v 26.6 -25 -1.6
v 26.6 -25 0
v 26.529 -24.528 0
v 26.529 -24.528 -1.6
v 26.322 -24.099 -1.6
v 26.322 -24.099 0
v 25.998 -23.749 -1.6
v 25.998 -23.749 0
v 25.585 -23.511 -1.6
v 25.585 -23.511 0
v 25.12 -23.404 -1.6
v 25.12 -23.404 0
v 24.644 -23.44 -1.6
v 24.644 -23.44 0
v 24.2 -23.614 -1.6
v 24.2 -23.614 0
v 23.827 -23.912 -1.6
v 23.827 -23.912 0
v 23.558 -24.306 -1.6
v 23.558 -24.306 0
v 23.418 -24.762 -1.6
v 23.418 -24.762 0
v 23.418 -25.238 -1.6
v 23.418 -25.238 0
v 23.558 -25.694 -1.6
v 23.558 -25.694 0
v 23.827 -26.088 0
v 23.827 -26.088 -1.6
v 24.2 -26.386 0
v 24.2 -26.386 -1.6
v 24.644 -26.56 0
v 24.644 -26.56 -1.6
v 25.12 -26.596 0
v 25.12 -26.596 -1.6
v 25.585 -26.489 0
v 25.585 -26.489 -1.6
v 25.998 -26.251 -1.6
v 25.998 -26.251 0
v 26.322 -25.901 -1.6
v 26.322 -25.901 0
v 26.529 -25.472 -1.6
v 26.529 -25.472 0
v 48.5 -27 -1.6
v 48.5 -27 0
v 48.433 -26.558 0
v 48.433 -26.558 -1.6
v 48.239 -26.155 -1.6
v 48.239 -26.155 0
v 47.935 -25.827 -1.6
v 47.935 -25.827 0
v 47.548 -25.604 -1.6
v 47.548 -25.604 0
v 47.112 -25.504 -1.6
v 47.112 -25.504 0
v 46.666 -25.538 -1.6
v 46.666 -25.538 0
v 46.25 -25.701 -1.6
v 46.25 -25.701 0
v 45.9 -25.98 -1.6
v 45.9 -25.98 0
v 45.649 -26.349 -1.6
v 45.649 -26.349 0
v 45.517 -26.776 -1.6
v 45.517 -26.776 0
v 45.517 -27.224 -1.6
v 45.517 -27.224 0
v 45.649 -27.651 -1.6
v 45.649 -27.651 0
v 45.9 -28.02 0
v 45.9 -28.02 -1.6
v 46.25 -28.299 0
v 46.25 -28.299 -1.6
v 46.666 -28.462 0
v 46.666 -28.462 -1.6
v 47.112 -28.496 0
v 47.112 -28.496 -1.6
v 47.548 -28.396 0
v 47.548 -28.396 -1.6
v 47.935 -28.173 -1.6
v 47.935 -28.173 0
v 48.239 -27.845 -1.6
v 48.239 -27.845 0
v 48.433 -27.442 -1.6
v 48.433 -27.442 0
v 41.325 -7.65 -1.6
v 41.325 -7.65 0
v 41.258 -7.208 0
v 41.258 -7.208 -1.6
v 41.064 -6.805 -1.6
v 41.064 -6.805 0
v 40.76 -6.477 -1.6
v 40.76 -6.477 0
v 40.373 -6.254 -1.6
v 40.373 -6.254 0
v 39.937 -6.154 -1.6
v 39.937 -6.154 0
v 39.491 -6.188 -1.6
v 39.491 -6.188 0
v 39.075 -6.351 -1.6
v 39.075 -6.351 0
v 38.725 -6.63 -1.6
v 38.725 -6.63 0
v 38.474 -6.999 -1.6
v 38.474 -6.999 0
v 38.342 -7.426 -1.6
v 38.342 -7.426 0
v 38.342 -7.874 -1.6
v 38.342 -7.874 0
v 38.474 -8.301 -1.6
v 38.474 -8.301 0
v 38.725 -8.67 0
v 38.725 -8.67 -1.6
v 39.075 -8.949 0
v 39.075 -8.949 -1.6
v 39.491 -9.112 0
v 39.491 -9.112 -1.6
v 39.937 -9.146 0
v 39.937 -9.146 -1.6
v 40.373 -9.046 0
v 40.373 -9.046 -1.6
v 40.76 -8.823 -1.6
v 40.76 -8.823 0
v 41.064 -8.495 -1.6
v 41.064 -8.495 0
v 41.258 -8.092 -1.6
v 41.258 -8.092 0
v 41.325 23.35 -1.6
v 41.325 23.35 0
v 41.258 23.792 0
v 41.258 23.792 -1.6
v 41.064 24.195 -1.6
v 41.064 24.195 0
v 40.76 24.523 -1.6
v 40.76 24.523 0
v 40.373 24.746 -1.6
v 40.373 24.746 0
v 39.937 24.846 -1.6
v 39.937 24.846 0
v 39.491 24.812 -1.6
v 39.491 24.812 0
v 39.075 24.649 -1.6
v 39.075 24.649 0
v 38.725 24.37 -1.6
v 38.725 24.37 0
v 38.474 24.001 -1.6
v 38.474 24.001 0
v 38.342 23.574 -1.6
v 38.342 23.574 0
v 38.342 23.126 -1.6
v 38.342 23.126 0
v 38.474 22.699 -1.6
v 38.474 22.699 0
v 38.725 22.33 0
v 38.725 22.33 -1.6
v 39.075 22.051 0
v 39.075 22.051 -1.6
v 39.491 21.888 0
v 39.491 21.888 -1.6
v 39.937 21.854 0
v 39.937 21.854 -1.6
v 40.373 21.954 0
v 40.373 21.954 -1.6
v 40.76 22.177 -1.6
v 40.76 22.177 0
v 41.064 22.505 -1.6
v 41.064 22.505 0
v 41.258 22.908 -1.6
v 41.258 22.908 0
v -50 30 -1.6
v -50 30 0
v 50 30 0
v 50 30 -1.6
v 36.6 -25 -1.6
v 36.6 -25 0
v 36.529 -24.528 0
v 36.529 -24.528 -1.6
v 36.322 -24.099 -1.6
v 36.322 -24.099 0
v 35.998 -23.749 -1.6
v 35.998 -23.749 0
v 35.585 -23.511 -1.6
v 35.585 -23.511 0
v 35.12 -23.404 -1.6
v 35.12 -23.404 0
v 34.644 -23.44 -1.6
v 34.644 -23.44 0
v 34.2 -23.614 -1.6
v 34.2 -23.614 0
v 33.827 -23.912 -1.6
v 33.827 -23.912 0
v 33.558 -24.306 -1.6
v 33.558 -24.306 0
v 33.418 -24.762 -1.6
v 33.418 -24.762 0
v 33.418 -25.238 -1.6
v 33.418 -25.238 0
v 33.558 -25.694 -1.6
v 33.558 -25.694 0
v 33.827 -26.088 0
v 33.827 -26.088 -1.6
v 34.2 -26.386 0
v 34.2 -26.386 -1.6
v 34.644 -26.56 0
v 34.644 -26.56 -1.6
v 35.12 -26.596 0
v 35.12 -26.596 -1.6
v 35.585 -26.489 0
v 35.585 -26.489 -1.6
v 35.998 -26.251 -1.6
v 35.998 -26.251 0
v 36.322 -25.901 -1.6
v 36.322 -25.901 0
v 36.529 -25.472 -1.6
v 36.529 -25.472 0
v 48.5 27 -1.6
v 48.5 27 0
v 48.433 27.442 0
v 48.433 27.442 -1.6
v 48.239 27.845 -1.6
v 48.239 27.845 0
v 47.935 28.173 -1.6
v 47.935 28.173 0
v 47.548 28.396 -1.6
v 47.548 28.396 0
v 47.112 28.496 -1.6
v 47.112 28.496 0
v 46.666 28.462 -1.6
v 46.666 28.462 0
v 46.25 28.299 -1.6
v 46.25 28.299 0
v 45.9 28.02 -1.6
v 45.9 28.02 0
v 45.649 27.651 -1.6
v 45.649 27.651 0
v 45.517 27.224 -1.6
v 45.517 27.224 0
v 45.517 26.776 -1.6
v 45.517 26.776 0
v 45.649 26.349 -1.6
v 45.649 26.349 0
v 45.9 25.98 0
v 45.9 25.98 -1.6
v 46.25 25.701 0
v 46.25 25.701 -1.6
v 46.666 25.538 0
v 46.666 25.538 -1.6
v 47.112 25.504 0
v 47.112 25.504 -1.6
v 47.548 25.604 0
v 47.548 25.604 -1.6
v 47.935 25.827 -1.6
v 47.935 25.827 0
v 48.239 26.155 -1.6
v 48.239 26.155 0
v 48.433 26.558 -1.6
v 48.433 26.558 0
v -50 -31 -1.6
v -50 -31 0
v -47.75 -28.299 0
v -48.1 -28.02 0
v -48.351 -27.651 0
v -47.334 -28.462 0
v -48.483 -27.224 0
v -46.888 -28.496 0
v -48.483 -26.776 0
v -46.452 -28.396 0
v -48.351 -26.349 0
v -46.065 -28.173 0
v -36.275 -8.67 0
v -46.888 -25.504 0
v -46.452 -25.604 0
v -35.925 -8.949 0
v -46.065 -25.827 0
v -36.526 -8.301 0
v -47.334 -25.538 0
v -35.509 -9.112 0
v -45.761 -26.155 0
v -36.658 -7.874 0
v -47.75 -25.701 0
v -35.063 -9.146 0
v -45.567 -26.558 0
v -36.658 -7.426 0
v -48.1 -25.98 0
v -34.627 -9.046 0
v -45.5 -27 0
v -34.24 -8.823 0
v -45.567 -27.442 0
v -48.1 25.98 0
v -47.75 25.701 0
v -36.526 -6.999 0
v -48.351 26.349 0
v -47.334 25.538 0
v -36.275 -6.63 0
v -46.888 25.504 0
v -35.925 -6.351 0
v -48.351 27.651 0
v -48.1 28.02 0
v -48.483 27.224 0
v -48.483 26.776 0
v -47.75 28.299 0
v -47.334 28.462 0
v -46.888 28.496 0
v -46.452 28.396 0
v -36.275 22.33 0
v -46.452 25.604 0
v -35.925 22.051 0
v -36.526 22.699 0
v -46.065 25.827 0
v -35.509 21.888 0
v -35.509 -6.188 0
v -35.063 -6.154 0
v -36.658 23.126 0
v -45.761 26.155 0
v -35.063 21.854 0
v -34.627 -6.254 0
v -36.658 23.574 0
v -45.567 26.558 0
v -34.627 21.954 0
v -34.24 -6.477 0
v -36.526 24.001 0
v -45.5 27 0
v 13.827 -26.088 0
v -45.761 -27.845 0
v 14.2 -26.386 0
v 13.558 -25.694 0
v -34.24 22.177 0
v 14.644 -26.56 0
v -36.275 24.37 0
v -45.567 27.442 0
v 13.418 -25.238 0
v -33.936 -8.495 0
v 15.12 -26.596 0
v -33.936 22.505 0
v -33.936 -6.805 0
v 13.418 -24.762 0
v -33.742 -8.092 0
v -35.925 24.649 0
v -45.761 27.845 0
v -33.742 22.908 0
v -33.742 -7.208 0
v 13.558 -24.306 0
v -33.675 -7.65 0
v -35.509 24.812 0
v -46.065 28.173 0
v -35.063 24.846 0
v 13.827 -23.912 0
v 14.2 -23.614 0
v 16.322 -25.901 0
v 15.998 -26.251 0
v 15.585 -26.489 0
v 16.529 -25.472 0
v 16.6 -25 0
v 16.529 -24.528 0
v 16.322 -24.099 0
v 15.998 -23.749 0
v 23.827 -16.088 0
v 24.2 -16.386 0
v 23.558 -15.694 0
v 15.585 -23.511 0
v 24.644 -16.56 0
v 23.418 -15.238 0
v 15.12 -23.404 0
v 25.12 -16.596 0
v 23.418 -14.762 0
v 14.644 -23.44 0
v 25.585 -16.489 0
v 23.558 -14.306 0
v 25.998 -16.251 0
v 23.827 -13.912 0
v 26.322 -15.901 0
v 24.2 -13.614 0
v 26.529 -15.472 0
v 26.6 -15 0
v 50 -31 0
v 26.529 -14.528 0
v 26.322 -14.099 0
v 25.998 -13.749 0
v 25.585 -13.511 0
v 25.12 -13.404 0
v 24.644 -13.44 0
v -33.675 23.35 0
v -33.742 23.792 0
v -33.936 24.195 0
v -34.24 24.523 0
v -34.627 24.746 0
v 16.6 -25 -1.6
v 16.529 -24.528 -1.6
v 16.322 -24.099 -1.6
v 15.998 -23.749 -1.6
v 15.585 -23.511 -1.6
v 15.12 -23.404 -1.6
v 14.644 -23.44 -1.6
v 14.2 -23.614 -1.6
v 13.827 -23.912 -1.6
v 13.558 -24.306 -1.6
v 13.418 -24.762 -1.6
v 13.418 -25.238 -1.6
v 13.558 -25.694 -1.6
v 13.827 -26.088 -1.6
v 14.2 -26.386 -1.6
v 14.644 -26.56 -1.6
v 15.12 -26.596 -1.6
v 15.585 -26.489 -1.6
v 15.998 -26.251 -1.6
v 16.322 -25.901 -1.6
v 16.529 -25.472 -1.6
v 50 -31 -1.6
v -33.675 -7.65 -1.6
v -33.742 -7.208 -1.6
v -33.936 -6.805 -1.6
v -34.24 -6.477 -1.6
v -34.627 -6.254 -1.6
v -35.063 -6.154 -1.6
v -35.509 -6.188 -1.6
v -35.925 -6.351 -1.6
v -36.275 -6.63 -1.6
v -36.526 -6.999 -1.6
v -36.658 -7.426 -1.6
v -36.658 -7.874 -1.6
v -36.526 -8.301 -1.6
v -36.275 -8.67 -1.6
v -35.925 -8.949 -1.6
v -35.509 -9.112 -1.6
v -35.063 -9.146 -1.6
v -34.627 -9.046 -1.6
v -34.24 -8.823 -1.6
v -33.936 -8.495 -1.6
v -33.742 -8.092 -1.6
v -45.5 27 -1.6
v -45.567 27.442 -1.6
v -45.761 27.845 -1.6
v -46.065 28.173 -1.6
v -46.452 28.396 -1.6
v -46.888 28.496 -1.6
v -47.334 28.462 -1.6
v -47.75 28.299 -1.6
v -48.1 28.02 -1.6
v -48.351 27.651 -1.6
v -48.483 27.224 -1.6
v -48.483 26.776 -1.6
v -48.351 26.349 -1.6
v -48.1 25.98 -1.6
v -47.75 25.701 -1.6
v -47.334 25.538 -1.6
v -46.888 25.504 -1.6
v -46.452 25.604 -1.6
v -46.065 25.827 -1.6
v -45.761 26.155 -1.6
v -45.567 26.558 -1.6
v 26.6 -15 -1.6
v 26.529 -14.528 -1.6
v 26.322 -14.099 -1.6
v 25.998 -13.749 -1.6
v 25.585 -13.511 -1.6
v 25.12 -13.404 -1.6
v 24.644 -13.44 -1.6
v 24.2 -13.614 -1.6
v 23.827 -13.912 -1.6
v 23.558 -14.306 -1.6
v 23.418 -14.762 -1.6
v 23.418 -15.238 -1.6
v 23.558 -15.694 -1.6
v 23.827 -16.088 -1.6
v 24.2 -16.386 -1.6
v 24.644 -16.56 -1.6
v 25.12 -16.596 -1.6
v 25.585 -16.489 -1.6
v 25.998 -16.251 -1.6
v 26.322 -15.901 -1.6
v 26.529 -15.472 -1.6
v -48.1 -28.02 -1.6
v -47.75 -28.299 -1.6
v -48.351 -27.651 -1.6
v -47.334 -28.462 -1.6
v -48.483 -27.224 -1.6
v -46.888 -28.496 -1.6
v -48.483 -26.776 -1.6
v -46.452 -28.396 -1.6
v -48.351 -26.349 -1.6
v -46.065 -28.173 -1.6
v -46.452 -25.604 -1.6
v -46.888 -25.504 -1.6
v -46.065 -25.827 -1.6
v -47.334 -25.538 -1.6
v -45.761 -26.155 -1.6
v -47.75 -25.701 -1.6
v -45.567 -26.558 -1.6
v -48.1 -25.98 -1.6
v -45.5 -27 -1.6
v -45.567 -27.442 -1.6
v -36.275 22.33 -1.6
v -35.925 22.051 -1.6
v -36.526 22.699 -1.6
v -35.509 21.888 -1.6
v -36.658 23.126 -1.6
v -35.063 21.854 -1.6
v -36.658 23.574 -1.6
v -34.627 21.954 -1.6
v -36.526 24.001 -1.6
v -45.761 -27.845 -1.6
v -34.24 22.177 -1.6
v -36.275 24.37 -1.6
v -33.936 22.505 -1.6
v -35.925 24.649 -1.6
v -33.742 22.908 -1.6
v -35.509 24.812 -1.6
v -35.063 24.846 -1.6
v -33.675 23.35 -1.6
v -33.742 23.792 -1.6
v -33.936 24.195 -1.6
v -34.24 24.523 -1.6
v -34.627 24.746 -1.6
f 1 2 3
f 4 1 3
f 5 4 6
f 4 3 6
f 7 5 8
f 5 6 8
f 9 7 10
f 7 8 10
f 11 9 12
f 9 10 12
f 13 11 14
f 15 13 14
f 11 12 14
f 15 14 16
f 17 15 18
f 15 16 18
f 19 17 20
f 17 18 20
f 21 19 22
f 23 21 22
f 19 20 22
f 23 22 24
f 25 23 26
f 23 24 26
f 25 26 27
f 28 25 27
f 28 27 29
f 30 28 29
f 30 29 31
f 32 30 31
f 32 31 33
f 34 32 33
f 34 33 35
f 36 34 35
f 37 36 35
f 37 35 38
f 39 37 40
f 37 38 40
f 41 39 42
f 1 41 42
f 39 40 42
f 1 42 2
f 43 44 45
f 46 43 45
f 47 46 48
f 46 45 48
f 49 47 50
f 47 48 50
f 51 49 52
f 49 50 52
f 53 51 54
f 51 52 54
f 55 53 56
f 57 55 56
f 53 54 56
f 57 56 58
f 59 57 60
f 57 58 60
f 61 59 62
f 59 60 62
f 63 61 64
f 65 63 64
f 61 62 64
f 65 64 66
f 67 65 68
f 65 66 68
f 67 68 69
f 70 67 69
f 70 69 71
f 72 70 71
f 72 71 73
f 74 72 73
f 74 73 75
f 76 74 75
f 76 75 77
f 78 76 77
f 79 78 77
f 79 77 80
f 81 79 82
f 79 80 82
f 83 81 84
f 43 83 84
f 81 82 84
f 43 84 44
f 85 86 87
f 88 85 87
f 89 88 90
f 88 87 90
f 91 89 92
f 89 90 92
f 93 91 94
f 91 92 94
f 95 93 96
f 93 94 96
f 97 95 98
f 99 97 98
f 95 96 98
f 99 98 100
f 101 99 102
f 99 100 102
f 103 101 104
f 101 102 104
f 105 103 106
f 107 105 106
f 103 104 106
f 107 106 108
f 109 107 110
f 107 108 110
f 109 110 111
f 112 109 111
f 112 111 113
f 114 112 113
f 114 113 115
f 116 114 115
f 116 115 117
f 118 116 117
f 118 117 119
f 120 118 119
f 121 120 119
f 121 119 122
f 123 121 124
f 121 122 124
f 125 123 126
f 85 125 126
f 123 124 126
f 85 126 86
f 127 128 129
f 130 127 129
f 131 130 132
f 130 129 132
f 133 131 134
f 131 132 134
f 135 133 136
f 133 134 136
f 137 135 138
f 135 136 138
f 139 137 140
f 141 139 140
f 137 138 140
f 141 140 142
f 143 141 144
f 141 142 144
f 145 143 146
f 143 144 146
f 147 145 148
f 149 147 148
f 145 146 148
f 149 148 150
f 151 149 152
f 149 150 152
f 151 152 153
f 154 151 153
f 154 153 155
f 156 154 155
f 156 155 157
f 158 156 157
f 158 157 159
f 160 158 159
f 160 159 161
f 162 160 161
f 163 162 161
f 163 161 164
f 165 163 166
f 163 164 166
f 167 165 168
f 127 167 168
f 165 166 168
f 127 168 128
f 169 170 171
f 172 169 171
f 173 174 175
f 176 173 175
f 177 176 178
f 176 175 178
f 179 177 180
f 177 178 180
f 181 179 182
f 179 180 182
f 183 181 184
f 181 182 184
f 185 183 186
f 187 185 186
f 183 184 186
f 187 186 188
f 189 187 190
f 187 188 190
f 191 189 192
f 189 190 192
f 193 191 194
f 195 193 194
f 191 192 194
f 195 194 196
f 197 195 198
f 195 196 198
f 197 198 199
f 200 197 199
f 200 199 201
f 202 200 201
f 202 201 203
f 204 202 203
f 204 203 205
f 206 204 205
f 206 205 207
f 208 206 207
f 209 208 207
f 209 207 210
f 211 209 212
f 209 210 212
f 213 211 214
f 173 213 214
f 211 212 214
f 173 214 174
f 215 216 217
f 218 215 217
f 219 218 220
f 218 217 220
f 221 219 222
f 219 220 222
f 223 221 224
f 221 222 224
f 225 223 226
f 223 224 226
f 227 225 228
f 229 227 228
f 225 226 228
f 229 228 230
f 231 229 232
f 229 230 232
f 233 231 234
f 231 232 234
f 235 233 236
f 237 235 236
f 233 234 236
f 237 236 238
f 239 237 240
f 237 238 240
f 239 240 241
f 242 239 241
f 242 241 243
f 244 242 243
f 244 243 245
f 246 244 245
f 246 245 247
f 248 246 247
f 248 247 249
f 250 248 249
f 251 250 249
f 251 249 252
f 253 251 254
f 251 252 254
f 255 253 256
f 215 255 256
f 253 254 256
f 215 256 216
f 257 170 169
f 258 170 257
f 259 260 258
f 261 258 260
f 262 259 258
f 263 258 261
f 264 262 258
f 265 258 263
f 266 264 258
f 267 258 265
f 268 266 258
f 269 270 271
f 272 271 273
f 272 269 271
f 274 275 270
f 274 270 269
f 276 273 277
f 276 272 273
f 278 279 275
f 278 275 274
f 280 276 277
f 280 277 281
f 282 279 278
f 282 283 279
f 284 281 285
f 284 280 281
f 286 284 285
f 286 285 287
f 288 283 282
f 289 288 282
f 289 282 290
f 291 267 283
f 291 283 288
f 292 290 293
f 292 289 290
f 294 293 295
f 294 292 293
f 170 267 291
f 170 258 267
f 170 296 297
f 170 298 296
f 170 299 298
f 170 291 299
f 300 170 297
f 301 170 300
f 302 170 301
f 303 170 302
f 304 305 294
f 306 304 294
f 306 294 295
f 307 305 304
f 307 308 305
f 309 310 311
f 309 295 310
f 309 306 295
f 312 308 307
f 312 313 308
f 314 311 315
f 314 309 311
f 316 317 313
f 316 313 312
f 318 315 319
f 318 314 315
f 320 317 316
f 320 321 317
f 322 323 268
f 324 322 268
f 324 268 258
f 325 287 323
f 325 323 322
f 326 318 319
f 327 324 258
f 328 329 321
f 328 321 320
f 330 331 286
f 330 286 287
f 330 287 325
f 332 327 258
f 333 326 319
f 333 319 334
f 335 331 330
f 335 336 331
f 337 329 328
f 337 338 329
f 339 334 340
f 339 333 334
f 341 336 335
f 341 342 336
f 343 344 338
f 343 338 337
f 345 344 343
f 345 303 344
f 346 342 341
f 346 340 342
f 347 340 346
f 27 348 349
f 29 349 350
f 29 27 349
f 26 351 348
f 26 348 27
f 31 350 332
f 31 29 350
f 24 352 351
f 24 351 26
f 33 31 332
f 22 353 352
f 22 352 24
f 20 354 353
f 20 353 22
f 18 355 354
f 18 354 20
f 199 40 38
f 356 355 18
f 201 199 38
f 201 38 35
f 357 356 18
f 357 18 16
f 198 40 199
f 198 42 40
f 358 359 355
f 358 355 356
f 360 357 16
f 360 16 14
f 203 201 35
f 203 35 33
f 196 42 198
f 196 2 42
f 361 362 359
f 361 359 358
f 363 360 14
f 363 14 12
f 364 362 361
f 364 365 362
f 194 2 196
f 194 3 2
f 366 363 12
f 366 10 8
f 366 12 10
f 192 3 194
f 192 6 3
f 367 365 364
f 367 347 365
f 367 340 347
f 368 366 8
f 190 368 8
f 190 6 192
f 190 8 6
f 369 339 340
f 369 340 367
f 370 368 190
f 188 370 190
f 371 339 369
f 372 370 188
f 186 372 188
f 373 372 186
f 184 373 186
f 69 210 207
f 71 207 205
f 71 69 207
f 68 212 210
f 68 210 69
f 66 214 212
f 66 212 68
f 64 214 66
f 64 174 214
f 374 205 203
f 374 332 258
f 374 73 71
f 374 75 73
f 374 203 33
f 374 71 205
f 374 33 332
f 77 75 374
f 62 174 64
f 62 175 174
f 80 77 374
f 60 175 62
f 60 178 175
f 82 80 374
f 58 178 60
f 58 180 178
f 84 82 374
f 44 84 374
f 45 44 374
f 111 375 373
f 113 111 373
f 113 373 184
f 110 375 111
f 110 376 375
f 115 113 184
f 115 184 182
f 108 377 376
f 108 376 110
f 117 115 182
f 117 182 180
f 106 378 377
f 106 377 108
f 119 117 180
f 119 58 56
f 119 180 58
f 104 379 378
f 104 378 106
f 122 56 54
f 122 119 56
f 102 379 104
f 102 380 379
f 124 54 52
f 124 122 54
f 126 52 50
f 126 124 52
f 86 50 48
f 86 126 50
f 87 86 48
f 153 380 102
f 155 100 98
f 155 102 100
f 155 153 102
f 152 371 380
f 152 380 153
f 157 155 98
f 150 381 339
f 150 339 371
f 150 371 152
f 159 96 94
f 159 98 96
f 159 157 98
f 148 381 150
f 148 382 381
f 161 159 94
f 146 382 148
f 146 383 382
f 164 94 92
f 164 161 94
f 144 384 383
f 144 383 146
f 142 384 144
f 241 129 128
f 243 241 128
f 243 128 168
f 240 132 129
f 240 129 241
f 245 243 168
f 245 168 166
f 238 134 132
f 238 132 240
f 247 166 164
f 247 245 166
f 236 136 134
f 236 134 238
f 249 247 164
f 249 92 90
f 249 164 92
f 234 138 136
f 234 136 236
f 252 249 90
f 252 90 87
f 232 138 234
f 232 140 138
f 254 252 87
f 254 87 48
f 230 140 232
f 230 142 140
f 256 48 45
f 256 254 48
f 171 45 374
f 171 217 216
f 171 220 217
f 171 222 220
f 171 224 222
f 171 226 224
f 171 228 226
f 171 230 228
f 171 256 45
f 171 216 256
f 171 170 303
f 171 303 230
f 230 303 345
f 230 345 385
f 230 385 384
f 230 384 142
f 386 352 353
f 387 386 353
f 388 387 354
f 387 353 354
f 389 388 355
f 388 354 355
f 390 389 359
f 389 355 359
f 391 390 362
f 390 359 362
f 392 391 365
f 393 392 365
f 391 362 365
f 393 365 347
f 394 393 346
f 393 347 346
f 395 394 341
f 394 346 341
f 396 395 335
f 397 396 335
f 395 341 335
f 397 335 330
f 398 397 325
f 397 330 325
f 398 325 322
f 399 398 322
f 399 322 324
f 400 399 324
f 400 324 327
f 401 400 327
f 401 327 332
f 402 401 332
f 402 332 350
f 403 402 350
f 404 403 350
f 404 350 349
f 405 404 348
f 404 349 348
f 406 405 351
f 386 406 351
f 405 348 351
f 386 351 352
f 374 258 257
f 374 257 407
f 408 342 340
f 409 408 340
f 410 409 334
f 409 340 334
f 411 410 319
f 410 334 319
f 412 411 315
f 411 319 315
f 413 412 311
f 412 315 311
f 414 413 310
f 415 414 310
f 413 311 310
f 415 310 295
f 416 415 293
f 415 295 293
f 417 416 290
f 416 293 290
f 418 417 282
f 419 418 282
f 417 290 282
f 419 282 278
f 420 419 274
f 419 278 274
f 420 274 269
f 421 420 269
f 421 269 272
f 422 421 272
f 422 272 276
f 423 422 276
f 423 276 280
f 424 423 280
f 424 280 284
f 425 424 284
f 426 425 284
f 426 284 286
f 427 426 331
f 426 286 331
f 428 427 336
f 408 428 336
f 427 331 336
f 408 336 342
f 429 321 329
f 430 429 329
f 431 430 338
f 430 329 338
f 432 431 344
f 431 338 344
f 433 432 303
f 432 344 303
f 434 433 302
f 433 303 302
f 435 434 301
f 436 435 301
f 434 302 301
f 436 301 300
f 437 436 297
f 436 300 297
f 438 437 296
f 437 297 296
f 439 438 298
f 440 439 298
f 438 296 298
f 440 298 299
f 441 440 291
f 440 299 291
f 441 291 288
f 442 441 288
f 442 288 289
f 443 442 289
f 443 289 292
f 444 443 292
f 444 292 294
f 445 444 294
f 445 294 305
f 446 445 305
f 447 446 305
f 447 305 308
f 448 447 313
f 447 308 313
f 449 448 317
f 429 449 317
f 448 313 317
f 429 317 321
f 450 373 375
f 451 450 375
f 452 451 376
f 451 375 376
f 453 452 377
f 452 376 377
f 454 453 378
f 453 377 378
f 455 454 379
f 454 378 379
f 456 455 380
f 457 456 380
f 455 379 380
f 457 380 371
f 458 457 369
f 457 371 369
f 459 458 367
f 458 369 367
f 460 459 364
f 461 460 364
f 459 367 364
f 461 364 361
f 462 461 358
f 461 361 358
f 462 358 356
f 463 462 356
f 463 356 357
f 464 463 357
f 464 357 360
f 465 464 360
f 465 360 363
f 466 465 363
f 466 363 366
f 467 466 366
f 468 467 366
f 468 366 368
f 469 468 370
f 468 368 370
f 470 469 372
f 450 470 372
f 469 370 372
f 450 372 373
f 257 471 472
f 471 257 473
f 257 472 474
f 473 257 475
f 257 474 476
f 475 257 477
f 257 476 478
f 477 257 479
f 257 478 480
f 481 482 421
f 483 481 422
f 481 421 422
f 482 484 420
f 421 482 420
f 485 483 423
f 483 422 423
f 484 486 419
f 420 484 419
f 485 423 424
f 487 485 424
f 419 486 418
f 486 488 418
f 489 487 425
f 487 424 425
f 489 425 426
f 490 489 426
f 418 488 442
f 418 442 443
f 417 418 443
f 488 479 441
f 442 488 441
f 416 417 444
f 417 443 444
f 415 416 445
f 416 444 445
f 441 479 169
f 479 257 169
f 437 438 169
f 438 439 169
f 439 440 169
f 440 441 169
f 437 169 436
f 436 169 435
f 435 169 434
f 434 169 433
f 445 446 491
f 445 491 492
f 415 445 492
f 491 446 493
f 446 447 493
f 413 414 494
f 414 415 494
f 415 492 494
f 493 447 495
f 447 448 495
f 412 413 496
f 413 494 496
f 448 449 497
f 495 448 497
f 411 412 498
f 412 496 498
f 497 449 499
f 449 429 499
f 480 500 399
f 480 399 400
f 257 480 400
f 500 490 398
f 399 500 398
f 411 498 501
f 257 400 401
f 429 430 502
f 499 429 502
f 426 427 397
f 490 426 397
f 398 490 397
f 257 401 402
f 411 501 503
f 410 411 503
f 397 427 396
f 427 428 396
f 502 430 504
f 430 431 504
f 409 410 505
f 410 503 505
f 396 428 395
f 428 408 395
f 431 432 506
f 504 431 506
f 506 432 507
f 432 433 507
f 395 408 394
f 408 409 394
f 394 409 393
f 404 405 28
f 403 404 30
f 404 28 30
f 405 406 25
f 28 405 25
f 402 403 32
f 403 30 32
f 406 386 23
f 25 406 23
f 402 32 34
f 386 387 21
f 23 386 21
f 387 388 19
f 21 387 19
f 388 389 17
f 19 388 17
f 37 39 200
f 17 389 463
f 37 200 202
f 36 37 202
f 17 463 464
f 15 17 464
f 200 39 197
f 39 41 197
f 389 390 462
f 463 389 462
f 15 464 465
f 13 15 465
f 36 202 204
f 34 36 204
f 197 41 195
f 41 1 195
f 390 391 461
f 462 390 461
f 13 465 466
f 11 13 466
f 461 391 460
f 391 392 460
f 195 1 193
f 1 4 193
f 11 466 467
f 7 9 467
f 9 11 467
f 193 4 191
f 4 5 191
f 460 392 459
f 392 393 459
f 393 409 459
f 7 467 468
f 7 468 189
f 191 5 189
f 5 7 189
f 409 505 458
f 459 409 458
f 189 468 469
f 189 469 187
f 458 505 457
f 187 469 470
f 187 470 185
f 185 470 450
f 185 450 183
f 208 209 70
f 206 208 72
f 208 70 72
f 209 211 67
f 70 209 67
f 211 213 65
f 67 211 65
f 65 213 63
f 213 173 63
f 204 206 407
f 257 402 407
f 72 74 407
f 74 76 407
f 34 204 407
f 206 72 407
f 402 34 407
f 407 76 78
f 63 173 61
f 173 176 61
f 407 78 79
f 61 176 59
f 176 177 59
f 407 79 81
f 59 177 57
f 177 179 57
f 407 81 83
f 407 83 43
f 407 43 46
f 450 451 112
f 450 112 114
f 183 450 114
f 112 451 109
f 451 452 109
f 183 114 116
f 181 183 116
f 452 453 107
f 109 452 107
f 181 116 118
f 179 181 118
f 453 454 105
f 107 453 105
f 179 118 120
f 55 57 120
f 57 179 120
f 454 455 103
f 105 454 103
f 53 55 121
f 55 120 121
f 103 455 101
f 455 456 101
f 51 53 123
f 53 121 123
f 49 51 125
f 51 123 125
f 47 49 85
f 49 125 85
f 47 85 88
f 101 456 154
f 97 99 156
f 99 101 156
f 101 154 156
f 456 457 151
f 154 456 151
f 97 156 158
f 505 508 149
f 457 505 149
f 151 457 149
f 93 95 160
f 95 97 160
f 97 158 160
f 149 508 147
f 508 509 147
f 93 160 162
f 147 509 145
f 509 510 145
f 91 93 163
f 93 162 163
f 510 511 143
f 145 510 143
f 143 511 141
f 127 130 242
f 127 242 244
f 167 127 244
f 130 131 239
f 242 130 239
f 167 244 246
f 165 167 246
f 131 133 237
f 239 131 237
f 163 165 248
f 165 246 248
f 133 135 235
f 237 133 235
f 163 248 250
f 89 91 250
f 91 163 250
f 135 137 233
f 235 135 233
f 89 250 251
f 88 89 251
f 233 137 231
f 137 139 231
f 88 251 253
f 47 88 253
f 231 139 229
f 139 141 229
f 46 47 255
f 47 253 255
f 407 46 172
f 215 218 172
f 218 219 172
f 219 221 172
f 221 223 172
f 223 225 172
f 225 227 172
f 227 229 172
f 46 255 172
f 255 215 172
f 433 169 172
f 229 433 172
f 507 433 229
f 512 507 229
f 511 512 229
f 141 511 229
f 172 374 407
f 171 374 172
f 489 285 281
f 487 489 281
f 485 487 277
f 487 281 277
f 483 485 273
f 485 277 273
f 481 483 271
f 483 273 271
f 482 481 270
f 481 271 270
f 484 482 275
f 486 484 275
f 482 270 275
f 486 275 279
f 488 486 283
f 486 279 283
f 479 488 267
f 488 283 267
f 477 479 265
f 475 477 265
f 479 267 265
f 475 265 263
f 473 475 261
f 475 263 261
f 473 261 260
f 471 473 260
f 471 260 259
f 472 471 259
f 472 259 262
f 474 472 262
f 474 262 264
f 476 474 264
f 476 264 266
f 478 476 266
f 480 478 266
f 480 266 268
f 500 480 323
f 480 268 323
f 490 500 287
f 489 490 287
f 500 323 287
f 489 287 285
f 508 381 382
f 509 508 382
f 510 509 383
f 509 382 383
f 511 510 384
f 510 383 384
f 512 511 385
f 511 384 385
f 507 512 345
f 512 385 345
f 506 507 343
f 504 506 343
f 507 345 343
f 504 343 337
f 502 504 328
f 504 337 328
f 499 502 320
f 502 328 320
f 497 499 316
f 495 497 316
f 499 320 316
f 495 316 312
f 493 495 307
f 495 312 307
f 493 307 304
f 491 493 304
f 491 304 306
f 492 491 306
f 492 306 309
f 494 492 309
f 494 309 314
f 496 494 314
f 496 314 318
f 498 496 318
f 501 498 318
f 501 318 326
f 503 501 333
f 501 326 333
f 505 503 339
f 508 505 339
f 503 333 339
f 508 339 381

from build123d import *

# Parameters (mm, degrees)
F0_W     = 100
F0_H     = 60
F0_R     = 1.5
F0_R_2   = 1.6
F0_H_2   = 1
F1_DEPTH = 1.6


with BuildPart() as f1:
    # F0 (on Top) → F1 (new body)
    with BuildSketch(Plane.XY):
        Rectangle(F0_W, F0_H)
        with Locations((-47, -27)):
            Circle(F0_R, mode=Mode.SUBTRACT)
        with Locations((-35.175, -7.65)):
            Circle(F0_R, mode=Mode.SUBTRACT)
        with Locations((15, -25)):
            Circle(F0_R_2, mode=Mode.SUBTRACT)
        with Locations((25, -25)):
            Circle(F0_R_2, mode=Mode.SUBTRACT)
        with Locations((35, -25)):
            Circle(F0_R_2, mode=Mode.SUBTRACT)
        with Locations((47, -27)):
            Circle(F0_R, mode=Mode.SUBTRACT)
        with Locations((25, -15)):
            Circle(F0_R_2, mode=Mode.SUBTRACT)
        with Locations((39.825, -7.65)):
            Circle(F0_R, mode=Mode.SUBTRACT)
        with Locations((-47, 27)):
            Circle(F0_R, mode=Mode.SUBTRACT)
        with Locations((-35.175, 23.35)):
            Circle(F0_R, mode=Mode.SUBTRACT)
        with Locations((39.825, 23.35)):
            Circle(F0_R, mode=Mode.SUBTRACT)
        with Locations((47, 27)):
            Circle(F0_R, mode=Mode.SUBTRACT)
        with Locations((0, -30.5)):
            Rectangle(F0_W, F0_H_2)
    extrude(amount=-F1_DEPTH)


solid = f1.part
